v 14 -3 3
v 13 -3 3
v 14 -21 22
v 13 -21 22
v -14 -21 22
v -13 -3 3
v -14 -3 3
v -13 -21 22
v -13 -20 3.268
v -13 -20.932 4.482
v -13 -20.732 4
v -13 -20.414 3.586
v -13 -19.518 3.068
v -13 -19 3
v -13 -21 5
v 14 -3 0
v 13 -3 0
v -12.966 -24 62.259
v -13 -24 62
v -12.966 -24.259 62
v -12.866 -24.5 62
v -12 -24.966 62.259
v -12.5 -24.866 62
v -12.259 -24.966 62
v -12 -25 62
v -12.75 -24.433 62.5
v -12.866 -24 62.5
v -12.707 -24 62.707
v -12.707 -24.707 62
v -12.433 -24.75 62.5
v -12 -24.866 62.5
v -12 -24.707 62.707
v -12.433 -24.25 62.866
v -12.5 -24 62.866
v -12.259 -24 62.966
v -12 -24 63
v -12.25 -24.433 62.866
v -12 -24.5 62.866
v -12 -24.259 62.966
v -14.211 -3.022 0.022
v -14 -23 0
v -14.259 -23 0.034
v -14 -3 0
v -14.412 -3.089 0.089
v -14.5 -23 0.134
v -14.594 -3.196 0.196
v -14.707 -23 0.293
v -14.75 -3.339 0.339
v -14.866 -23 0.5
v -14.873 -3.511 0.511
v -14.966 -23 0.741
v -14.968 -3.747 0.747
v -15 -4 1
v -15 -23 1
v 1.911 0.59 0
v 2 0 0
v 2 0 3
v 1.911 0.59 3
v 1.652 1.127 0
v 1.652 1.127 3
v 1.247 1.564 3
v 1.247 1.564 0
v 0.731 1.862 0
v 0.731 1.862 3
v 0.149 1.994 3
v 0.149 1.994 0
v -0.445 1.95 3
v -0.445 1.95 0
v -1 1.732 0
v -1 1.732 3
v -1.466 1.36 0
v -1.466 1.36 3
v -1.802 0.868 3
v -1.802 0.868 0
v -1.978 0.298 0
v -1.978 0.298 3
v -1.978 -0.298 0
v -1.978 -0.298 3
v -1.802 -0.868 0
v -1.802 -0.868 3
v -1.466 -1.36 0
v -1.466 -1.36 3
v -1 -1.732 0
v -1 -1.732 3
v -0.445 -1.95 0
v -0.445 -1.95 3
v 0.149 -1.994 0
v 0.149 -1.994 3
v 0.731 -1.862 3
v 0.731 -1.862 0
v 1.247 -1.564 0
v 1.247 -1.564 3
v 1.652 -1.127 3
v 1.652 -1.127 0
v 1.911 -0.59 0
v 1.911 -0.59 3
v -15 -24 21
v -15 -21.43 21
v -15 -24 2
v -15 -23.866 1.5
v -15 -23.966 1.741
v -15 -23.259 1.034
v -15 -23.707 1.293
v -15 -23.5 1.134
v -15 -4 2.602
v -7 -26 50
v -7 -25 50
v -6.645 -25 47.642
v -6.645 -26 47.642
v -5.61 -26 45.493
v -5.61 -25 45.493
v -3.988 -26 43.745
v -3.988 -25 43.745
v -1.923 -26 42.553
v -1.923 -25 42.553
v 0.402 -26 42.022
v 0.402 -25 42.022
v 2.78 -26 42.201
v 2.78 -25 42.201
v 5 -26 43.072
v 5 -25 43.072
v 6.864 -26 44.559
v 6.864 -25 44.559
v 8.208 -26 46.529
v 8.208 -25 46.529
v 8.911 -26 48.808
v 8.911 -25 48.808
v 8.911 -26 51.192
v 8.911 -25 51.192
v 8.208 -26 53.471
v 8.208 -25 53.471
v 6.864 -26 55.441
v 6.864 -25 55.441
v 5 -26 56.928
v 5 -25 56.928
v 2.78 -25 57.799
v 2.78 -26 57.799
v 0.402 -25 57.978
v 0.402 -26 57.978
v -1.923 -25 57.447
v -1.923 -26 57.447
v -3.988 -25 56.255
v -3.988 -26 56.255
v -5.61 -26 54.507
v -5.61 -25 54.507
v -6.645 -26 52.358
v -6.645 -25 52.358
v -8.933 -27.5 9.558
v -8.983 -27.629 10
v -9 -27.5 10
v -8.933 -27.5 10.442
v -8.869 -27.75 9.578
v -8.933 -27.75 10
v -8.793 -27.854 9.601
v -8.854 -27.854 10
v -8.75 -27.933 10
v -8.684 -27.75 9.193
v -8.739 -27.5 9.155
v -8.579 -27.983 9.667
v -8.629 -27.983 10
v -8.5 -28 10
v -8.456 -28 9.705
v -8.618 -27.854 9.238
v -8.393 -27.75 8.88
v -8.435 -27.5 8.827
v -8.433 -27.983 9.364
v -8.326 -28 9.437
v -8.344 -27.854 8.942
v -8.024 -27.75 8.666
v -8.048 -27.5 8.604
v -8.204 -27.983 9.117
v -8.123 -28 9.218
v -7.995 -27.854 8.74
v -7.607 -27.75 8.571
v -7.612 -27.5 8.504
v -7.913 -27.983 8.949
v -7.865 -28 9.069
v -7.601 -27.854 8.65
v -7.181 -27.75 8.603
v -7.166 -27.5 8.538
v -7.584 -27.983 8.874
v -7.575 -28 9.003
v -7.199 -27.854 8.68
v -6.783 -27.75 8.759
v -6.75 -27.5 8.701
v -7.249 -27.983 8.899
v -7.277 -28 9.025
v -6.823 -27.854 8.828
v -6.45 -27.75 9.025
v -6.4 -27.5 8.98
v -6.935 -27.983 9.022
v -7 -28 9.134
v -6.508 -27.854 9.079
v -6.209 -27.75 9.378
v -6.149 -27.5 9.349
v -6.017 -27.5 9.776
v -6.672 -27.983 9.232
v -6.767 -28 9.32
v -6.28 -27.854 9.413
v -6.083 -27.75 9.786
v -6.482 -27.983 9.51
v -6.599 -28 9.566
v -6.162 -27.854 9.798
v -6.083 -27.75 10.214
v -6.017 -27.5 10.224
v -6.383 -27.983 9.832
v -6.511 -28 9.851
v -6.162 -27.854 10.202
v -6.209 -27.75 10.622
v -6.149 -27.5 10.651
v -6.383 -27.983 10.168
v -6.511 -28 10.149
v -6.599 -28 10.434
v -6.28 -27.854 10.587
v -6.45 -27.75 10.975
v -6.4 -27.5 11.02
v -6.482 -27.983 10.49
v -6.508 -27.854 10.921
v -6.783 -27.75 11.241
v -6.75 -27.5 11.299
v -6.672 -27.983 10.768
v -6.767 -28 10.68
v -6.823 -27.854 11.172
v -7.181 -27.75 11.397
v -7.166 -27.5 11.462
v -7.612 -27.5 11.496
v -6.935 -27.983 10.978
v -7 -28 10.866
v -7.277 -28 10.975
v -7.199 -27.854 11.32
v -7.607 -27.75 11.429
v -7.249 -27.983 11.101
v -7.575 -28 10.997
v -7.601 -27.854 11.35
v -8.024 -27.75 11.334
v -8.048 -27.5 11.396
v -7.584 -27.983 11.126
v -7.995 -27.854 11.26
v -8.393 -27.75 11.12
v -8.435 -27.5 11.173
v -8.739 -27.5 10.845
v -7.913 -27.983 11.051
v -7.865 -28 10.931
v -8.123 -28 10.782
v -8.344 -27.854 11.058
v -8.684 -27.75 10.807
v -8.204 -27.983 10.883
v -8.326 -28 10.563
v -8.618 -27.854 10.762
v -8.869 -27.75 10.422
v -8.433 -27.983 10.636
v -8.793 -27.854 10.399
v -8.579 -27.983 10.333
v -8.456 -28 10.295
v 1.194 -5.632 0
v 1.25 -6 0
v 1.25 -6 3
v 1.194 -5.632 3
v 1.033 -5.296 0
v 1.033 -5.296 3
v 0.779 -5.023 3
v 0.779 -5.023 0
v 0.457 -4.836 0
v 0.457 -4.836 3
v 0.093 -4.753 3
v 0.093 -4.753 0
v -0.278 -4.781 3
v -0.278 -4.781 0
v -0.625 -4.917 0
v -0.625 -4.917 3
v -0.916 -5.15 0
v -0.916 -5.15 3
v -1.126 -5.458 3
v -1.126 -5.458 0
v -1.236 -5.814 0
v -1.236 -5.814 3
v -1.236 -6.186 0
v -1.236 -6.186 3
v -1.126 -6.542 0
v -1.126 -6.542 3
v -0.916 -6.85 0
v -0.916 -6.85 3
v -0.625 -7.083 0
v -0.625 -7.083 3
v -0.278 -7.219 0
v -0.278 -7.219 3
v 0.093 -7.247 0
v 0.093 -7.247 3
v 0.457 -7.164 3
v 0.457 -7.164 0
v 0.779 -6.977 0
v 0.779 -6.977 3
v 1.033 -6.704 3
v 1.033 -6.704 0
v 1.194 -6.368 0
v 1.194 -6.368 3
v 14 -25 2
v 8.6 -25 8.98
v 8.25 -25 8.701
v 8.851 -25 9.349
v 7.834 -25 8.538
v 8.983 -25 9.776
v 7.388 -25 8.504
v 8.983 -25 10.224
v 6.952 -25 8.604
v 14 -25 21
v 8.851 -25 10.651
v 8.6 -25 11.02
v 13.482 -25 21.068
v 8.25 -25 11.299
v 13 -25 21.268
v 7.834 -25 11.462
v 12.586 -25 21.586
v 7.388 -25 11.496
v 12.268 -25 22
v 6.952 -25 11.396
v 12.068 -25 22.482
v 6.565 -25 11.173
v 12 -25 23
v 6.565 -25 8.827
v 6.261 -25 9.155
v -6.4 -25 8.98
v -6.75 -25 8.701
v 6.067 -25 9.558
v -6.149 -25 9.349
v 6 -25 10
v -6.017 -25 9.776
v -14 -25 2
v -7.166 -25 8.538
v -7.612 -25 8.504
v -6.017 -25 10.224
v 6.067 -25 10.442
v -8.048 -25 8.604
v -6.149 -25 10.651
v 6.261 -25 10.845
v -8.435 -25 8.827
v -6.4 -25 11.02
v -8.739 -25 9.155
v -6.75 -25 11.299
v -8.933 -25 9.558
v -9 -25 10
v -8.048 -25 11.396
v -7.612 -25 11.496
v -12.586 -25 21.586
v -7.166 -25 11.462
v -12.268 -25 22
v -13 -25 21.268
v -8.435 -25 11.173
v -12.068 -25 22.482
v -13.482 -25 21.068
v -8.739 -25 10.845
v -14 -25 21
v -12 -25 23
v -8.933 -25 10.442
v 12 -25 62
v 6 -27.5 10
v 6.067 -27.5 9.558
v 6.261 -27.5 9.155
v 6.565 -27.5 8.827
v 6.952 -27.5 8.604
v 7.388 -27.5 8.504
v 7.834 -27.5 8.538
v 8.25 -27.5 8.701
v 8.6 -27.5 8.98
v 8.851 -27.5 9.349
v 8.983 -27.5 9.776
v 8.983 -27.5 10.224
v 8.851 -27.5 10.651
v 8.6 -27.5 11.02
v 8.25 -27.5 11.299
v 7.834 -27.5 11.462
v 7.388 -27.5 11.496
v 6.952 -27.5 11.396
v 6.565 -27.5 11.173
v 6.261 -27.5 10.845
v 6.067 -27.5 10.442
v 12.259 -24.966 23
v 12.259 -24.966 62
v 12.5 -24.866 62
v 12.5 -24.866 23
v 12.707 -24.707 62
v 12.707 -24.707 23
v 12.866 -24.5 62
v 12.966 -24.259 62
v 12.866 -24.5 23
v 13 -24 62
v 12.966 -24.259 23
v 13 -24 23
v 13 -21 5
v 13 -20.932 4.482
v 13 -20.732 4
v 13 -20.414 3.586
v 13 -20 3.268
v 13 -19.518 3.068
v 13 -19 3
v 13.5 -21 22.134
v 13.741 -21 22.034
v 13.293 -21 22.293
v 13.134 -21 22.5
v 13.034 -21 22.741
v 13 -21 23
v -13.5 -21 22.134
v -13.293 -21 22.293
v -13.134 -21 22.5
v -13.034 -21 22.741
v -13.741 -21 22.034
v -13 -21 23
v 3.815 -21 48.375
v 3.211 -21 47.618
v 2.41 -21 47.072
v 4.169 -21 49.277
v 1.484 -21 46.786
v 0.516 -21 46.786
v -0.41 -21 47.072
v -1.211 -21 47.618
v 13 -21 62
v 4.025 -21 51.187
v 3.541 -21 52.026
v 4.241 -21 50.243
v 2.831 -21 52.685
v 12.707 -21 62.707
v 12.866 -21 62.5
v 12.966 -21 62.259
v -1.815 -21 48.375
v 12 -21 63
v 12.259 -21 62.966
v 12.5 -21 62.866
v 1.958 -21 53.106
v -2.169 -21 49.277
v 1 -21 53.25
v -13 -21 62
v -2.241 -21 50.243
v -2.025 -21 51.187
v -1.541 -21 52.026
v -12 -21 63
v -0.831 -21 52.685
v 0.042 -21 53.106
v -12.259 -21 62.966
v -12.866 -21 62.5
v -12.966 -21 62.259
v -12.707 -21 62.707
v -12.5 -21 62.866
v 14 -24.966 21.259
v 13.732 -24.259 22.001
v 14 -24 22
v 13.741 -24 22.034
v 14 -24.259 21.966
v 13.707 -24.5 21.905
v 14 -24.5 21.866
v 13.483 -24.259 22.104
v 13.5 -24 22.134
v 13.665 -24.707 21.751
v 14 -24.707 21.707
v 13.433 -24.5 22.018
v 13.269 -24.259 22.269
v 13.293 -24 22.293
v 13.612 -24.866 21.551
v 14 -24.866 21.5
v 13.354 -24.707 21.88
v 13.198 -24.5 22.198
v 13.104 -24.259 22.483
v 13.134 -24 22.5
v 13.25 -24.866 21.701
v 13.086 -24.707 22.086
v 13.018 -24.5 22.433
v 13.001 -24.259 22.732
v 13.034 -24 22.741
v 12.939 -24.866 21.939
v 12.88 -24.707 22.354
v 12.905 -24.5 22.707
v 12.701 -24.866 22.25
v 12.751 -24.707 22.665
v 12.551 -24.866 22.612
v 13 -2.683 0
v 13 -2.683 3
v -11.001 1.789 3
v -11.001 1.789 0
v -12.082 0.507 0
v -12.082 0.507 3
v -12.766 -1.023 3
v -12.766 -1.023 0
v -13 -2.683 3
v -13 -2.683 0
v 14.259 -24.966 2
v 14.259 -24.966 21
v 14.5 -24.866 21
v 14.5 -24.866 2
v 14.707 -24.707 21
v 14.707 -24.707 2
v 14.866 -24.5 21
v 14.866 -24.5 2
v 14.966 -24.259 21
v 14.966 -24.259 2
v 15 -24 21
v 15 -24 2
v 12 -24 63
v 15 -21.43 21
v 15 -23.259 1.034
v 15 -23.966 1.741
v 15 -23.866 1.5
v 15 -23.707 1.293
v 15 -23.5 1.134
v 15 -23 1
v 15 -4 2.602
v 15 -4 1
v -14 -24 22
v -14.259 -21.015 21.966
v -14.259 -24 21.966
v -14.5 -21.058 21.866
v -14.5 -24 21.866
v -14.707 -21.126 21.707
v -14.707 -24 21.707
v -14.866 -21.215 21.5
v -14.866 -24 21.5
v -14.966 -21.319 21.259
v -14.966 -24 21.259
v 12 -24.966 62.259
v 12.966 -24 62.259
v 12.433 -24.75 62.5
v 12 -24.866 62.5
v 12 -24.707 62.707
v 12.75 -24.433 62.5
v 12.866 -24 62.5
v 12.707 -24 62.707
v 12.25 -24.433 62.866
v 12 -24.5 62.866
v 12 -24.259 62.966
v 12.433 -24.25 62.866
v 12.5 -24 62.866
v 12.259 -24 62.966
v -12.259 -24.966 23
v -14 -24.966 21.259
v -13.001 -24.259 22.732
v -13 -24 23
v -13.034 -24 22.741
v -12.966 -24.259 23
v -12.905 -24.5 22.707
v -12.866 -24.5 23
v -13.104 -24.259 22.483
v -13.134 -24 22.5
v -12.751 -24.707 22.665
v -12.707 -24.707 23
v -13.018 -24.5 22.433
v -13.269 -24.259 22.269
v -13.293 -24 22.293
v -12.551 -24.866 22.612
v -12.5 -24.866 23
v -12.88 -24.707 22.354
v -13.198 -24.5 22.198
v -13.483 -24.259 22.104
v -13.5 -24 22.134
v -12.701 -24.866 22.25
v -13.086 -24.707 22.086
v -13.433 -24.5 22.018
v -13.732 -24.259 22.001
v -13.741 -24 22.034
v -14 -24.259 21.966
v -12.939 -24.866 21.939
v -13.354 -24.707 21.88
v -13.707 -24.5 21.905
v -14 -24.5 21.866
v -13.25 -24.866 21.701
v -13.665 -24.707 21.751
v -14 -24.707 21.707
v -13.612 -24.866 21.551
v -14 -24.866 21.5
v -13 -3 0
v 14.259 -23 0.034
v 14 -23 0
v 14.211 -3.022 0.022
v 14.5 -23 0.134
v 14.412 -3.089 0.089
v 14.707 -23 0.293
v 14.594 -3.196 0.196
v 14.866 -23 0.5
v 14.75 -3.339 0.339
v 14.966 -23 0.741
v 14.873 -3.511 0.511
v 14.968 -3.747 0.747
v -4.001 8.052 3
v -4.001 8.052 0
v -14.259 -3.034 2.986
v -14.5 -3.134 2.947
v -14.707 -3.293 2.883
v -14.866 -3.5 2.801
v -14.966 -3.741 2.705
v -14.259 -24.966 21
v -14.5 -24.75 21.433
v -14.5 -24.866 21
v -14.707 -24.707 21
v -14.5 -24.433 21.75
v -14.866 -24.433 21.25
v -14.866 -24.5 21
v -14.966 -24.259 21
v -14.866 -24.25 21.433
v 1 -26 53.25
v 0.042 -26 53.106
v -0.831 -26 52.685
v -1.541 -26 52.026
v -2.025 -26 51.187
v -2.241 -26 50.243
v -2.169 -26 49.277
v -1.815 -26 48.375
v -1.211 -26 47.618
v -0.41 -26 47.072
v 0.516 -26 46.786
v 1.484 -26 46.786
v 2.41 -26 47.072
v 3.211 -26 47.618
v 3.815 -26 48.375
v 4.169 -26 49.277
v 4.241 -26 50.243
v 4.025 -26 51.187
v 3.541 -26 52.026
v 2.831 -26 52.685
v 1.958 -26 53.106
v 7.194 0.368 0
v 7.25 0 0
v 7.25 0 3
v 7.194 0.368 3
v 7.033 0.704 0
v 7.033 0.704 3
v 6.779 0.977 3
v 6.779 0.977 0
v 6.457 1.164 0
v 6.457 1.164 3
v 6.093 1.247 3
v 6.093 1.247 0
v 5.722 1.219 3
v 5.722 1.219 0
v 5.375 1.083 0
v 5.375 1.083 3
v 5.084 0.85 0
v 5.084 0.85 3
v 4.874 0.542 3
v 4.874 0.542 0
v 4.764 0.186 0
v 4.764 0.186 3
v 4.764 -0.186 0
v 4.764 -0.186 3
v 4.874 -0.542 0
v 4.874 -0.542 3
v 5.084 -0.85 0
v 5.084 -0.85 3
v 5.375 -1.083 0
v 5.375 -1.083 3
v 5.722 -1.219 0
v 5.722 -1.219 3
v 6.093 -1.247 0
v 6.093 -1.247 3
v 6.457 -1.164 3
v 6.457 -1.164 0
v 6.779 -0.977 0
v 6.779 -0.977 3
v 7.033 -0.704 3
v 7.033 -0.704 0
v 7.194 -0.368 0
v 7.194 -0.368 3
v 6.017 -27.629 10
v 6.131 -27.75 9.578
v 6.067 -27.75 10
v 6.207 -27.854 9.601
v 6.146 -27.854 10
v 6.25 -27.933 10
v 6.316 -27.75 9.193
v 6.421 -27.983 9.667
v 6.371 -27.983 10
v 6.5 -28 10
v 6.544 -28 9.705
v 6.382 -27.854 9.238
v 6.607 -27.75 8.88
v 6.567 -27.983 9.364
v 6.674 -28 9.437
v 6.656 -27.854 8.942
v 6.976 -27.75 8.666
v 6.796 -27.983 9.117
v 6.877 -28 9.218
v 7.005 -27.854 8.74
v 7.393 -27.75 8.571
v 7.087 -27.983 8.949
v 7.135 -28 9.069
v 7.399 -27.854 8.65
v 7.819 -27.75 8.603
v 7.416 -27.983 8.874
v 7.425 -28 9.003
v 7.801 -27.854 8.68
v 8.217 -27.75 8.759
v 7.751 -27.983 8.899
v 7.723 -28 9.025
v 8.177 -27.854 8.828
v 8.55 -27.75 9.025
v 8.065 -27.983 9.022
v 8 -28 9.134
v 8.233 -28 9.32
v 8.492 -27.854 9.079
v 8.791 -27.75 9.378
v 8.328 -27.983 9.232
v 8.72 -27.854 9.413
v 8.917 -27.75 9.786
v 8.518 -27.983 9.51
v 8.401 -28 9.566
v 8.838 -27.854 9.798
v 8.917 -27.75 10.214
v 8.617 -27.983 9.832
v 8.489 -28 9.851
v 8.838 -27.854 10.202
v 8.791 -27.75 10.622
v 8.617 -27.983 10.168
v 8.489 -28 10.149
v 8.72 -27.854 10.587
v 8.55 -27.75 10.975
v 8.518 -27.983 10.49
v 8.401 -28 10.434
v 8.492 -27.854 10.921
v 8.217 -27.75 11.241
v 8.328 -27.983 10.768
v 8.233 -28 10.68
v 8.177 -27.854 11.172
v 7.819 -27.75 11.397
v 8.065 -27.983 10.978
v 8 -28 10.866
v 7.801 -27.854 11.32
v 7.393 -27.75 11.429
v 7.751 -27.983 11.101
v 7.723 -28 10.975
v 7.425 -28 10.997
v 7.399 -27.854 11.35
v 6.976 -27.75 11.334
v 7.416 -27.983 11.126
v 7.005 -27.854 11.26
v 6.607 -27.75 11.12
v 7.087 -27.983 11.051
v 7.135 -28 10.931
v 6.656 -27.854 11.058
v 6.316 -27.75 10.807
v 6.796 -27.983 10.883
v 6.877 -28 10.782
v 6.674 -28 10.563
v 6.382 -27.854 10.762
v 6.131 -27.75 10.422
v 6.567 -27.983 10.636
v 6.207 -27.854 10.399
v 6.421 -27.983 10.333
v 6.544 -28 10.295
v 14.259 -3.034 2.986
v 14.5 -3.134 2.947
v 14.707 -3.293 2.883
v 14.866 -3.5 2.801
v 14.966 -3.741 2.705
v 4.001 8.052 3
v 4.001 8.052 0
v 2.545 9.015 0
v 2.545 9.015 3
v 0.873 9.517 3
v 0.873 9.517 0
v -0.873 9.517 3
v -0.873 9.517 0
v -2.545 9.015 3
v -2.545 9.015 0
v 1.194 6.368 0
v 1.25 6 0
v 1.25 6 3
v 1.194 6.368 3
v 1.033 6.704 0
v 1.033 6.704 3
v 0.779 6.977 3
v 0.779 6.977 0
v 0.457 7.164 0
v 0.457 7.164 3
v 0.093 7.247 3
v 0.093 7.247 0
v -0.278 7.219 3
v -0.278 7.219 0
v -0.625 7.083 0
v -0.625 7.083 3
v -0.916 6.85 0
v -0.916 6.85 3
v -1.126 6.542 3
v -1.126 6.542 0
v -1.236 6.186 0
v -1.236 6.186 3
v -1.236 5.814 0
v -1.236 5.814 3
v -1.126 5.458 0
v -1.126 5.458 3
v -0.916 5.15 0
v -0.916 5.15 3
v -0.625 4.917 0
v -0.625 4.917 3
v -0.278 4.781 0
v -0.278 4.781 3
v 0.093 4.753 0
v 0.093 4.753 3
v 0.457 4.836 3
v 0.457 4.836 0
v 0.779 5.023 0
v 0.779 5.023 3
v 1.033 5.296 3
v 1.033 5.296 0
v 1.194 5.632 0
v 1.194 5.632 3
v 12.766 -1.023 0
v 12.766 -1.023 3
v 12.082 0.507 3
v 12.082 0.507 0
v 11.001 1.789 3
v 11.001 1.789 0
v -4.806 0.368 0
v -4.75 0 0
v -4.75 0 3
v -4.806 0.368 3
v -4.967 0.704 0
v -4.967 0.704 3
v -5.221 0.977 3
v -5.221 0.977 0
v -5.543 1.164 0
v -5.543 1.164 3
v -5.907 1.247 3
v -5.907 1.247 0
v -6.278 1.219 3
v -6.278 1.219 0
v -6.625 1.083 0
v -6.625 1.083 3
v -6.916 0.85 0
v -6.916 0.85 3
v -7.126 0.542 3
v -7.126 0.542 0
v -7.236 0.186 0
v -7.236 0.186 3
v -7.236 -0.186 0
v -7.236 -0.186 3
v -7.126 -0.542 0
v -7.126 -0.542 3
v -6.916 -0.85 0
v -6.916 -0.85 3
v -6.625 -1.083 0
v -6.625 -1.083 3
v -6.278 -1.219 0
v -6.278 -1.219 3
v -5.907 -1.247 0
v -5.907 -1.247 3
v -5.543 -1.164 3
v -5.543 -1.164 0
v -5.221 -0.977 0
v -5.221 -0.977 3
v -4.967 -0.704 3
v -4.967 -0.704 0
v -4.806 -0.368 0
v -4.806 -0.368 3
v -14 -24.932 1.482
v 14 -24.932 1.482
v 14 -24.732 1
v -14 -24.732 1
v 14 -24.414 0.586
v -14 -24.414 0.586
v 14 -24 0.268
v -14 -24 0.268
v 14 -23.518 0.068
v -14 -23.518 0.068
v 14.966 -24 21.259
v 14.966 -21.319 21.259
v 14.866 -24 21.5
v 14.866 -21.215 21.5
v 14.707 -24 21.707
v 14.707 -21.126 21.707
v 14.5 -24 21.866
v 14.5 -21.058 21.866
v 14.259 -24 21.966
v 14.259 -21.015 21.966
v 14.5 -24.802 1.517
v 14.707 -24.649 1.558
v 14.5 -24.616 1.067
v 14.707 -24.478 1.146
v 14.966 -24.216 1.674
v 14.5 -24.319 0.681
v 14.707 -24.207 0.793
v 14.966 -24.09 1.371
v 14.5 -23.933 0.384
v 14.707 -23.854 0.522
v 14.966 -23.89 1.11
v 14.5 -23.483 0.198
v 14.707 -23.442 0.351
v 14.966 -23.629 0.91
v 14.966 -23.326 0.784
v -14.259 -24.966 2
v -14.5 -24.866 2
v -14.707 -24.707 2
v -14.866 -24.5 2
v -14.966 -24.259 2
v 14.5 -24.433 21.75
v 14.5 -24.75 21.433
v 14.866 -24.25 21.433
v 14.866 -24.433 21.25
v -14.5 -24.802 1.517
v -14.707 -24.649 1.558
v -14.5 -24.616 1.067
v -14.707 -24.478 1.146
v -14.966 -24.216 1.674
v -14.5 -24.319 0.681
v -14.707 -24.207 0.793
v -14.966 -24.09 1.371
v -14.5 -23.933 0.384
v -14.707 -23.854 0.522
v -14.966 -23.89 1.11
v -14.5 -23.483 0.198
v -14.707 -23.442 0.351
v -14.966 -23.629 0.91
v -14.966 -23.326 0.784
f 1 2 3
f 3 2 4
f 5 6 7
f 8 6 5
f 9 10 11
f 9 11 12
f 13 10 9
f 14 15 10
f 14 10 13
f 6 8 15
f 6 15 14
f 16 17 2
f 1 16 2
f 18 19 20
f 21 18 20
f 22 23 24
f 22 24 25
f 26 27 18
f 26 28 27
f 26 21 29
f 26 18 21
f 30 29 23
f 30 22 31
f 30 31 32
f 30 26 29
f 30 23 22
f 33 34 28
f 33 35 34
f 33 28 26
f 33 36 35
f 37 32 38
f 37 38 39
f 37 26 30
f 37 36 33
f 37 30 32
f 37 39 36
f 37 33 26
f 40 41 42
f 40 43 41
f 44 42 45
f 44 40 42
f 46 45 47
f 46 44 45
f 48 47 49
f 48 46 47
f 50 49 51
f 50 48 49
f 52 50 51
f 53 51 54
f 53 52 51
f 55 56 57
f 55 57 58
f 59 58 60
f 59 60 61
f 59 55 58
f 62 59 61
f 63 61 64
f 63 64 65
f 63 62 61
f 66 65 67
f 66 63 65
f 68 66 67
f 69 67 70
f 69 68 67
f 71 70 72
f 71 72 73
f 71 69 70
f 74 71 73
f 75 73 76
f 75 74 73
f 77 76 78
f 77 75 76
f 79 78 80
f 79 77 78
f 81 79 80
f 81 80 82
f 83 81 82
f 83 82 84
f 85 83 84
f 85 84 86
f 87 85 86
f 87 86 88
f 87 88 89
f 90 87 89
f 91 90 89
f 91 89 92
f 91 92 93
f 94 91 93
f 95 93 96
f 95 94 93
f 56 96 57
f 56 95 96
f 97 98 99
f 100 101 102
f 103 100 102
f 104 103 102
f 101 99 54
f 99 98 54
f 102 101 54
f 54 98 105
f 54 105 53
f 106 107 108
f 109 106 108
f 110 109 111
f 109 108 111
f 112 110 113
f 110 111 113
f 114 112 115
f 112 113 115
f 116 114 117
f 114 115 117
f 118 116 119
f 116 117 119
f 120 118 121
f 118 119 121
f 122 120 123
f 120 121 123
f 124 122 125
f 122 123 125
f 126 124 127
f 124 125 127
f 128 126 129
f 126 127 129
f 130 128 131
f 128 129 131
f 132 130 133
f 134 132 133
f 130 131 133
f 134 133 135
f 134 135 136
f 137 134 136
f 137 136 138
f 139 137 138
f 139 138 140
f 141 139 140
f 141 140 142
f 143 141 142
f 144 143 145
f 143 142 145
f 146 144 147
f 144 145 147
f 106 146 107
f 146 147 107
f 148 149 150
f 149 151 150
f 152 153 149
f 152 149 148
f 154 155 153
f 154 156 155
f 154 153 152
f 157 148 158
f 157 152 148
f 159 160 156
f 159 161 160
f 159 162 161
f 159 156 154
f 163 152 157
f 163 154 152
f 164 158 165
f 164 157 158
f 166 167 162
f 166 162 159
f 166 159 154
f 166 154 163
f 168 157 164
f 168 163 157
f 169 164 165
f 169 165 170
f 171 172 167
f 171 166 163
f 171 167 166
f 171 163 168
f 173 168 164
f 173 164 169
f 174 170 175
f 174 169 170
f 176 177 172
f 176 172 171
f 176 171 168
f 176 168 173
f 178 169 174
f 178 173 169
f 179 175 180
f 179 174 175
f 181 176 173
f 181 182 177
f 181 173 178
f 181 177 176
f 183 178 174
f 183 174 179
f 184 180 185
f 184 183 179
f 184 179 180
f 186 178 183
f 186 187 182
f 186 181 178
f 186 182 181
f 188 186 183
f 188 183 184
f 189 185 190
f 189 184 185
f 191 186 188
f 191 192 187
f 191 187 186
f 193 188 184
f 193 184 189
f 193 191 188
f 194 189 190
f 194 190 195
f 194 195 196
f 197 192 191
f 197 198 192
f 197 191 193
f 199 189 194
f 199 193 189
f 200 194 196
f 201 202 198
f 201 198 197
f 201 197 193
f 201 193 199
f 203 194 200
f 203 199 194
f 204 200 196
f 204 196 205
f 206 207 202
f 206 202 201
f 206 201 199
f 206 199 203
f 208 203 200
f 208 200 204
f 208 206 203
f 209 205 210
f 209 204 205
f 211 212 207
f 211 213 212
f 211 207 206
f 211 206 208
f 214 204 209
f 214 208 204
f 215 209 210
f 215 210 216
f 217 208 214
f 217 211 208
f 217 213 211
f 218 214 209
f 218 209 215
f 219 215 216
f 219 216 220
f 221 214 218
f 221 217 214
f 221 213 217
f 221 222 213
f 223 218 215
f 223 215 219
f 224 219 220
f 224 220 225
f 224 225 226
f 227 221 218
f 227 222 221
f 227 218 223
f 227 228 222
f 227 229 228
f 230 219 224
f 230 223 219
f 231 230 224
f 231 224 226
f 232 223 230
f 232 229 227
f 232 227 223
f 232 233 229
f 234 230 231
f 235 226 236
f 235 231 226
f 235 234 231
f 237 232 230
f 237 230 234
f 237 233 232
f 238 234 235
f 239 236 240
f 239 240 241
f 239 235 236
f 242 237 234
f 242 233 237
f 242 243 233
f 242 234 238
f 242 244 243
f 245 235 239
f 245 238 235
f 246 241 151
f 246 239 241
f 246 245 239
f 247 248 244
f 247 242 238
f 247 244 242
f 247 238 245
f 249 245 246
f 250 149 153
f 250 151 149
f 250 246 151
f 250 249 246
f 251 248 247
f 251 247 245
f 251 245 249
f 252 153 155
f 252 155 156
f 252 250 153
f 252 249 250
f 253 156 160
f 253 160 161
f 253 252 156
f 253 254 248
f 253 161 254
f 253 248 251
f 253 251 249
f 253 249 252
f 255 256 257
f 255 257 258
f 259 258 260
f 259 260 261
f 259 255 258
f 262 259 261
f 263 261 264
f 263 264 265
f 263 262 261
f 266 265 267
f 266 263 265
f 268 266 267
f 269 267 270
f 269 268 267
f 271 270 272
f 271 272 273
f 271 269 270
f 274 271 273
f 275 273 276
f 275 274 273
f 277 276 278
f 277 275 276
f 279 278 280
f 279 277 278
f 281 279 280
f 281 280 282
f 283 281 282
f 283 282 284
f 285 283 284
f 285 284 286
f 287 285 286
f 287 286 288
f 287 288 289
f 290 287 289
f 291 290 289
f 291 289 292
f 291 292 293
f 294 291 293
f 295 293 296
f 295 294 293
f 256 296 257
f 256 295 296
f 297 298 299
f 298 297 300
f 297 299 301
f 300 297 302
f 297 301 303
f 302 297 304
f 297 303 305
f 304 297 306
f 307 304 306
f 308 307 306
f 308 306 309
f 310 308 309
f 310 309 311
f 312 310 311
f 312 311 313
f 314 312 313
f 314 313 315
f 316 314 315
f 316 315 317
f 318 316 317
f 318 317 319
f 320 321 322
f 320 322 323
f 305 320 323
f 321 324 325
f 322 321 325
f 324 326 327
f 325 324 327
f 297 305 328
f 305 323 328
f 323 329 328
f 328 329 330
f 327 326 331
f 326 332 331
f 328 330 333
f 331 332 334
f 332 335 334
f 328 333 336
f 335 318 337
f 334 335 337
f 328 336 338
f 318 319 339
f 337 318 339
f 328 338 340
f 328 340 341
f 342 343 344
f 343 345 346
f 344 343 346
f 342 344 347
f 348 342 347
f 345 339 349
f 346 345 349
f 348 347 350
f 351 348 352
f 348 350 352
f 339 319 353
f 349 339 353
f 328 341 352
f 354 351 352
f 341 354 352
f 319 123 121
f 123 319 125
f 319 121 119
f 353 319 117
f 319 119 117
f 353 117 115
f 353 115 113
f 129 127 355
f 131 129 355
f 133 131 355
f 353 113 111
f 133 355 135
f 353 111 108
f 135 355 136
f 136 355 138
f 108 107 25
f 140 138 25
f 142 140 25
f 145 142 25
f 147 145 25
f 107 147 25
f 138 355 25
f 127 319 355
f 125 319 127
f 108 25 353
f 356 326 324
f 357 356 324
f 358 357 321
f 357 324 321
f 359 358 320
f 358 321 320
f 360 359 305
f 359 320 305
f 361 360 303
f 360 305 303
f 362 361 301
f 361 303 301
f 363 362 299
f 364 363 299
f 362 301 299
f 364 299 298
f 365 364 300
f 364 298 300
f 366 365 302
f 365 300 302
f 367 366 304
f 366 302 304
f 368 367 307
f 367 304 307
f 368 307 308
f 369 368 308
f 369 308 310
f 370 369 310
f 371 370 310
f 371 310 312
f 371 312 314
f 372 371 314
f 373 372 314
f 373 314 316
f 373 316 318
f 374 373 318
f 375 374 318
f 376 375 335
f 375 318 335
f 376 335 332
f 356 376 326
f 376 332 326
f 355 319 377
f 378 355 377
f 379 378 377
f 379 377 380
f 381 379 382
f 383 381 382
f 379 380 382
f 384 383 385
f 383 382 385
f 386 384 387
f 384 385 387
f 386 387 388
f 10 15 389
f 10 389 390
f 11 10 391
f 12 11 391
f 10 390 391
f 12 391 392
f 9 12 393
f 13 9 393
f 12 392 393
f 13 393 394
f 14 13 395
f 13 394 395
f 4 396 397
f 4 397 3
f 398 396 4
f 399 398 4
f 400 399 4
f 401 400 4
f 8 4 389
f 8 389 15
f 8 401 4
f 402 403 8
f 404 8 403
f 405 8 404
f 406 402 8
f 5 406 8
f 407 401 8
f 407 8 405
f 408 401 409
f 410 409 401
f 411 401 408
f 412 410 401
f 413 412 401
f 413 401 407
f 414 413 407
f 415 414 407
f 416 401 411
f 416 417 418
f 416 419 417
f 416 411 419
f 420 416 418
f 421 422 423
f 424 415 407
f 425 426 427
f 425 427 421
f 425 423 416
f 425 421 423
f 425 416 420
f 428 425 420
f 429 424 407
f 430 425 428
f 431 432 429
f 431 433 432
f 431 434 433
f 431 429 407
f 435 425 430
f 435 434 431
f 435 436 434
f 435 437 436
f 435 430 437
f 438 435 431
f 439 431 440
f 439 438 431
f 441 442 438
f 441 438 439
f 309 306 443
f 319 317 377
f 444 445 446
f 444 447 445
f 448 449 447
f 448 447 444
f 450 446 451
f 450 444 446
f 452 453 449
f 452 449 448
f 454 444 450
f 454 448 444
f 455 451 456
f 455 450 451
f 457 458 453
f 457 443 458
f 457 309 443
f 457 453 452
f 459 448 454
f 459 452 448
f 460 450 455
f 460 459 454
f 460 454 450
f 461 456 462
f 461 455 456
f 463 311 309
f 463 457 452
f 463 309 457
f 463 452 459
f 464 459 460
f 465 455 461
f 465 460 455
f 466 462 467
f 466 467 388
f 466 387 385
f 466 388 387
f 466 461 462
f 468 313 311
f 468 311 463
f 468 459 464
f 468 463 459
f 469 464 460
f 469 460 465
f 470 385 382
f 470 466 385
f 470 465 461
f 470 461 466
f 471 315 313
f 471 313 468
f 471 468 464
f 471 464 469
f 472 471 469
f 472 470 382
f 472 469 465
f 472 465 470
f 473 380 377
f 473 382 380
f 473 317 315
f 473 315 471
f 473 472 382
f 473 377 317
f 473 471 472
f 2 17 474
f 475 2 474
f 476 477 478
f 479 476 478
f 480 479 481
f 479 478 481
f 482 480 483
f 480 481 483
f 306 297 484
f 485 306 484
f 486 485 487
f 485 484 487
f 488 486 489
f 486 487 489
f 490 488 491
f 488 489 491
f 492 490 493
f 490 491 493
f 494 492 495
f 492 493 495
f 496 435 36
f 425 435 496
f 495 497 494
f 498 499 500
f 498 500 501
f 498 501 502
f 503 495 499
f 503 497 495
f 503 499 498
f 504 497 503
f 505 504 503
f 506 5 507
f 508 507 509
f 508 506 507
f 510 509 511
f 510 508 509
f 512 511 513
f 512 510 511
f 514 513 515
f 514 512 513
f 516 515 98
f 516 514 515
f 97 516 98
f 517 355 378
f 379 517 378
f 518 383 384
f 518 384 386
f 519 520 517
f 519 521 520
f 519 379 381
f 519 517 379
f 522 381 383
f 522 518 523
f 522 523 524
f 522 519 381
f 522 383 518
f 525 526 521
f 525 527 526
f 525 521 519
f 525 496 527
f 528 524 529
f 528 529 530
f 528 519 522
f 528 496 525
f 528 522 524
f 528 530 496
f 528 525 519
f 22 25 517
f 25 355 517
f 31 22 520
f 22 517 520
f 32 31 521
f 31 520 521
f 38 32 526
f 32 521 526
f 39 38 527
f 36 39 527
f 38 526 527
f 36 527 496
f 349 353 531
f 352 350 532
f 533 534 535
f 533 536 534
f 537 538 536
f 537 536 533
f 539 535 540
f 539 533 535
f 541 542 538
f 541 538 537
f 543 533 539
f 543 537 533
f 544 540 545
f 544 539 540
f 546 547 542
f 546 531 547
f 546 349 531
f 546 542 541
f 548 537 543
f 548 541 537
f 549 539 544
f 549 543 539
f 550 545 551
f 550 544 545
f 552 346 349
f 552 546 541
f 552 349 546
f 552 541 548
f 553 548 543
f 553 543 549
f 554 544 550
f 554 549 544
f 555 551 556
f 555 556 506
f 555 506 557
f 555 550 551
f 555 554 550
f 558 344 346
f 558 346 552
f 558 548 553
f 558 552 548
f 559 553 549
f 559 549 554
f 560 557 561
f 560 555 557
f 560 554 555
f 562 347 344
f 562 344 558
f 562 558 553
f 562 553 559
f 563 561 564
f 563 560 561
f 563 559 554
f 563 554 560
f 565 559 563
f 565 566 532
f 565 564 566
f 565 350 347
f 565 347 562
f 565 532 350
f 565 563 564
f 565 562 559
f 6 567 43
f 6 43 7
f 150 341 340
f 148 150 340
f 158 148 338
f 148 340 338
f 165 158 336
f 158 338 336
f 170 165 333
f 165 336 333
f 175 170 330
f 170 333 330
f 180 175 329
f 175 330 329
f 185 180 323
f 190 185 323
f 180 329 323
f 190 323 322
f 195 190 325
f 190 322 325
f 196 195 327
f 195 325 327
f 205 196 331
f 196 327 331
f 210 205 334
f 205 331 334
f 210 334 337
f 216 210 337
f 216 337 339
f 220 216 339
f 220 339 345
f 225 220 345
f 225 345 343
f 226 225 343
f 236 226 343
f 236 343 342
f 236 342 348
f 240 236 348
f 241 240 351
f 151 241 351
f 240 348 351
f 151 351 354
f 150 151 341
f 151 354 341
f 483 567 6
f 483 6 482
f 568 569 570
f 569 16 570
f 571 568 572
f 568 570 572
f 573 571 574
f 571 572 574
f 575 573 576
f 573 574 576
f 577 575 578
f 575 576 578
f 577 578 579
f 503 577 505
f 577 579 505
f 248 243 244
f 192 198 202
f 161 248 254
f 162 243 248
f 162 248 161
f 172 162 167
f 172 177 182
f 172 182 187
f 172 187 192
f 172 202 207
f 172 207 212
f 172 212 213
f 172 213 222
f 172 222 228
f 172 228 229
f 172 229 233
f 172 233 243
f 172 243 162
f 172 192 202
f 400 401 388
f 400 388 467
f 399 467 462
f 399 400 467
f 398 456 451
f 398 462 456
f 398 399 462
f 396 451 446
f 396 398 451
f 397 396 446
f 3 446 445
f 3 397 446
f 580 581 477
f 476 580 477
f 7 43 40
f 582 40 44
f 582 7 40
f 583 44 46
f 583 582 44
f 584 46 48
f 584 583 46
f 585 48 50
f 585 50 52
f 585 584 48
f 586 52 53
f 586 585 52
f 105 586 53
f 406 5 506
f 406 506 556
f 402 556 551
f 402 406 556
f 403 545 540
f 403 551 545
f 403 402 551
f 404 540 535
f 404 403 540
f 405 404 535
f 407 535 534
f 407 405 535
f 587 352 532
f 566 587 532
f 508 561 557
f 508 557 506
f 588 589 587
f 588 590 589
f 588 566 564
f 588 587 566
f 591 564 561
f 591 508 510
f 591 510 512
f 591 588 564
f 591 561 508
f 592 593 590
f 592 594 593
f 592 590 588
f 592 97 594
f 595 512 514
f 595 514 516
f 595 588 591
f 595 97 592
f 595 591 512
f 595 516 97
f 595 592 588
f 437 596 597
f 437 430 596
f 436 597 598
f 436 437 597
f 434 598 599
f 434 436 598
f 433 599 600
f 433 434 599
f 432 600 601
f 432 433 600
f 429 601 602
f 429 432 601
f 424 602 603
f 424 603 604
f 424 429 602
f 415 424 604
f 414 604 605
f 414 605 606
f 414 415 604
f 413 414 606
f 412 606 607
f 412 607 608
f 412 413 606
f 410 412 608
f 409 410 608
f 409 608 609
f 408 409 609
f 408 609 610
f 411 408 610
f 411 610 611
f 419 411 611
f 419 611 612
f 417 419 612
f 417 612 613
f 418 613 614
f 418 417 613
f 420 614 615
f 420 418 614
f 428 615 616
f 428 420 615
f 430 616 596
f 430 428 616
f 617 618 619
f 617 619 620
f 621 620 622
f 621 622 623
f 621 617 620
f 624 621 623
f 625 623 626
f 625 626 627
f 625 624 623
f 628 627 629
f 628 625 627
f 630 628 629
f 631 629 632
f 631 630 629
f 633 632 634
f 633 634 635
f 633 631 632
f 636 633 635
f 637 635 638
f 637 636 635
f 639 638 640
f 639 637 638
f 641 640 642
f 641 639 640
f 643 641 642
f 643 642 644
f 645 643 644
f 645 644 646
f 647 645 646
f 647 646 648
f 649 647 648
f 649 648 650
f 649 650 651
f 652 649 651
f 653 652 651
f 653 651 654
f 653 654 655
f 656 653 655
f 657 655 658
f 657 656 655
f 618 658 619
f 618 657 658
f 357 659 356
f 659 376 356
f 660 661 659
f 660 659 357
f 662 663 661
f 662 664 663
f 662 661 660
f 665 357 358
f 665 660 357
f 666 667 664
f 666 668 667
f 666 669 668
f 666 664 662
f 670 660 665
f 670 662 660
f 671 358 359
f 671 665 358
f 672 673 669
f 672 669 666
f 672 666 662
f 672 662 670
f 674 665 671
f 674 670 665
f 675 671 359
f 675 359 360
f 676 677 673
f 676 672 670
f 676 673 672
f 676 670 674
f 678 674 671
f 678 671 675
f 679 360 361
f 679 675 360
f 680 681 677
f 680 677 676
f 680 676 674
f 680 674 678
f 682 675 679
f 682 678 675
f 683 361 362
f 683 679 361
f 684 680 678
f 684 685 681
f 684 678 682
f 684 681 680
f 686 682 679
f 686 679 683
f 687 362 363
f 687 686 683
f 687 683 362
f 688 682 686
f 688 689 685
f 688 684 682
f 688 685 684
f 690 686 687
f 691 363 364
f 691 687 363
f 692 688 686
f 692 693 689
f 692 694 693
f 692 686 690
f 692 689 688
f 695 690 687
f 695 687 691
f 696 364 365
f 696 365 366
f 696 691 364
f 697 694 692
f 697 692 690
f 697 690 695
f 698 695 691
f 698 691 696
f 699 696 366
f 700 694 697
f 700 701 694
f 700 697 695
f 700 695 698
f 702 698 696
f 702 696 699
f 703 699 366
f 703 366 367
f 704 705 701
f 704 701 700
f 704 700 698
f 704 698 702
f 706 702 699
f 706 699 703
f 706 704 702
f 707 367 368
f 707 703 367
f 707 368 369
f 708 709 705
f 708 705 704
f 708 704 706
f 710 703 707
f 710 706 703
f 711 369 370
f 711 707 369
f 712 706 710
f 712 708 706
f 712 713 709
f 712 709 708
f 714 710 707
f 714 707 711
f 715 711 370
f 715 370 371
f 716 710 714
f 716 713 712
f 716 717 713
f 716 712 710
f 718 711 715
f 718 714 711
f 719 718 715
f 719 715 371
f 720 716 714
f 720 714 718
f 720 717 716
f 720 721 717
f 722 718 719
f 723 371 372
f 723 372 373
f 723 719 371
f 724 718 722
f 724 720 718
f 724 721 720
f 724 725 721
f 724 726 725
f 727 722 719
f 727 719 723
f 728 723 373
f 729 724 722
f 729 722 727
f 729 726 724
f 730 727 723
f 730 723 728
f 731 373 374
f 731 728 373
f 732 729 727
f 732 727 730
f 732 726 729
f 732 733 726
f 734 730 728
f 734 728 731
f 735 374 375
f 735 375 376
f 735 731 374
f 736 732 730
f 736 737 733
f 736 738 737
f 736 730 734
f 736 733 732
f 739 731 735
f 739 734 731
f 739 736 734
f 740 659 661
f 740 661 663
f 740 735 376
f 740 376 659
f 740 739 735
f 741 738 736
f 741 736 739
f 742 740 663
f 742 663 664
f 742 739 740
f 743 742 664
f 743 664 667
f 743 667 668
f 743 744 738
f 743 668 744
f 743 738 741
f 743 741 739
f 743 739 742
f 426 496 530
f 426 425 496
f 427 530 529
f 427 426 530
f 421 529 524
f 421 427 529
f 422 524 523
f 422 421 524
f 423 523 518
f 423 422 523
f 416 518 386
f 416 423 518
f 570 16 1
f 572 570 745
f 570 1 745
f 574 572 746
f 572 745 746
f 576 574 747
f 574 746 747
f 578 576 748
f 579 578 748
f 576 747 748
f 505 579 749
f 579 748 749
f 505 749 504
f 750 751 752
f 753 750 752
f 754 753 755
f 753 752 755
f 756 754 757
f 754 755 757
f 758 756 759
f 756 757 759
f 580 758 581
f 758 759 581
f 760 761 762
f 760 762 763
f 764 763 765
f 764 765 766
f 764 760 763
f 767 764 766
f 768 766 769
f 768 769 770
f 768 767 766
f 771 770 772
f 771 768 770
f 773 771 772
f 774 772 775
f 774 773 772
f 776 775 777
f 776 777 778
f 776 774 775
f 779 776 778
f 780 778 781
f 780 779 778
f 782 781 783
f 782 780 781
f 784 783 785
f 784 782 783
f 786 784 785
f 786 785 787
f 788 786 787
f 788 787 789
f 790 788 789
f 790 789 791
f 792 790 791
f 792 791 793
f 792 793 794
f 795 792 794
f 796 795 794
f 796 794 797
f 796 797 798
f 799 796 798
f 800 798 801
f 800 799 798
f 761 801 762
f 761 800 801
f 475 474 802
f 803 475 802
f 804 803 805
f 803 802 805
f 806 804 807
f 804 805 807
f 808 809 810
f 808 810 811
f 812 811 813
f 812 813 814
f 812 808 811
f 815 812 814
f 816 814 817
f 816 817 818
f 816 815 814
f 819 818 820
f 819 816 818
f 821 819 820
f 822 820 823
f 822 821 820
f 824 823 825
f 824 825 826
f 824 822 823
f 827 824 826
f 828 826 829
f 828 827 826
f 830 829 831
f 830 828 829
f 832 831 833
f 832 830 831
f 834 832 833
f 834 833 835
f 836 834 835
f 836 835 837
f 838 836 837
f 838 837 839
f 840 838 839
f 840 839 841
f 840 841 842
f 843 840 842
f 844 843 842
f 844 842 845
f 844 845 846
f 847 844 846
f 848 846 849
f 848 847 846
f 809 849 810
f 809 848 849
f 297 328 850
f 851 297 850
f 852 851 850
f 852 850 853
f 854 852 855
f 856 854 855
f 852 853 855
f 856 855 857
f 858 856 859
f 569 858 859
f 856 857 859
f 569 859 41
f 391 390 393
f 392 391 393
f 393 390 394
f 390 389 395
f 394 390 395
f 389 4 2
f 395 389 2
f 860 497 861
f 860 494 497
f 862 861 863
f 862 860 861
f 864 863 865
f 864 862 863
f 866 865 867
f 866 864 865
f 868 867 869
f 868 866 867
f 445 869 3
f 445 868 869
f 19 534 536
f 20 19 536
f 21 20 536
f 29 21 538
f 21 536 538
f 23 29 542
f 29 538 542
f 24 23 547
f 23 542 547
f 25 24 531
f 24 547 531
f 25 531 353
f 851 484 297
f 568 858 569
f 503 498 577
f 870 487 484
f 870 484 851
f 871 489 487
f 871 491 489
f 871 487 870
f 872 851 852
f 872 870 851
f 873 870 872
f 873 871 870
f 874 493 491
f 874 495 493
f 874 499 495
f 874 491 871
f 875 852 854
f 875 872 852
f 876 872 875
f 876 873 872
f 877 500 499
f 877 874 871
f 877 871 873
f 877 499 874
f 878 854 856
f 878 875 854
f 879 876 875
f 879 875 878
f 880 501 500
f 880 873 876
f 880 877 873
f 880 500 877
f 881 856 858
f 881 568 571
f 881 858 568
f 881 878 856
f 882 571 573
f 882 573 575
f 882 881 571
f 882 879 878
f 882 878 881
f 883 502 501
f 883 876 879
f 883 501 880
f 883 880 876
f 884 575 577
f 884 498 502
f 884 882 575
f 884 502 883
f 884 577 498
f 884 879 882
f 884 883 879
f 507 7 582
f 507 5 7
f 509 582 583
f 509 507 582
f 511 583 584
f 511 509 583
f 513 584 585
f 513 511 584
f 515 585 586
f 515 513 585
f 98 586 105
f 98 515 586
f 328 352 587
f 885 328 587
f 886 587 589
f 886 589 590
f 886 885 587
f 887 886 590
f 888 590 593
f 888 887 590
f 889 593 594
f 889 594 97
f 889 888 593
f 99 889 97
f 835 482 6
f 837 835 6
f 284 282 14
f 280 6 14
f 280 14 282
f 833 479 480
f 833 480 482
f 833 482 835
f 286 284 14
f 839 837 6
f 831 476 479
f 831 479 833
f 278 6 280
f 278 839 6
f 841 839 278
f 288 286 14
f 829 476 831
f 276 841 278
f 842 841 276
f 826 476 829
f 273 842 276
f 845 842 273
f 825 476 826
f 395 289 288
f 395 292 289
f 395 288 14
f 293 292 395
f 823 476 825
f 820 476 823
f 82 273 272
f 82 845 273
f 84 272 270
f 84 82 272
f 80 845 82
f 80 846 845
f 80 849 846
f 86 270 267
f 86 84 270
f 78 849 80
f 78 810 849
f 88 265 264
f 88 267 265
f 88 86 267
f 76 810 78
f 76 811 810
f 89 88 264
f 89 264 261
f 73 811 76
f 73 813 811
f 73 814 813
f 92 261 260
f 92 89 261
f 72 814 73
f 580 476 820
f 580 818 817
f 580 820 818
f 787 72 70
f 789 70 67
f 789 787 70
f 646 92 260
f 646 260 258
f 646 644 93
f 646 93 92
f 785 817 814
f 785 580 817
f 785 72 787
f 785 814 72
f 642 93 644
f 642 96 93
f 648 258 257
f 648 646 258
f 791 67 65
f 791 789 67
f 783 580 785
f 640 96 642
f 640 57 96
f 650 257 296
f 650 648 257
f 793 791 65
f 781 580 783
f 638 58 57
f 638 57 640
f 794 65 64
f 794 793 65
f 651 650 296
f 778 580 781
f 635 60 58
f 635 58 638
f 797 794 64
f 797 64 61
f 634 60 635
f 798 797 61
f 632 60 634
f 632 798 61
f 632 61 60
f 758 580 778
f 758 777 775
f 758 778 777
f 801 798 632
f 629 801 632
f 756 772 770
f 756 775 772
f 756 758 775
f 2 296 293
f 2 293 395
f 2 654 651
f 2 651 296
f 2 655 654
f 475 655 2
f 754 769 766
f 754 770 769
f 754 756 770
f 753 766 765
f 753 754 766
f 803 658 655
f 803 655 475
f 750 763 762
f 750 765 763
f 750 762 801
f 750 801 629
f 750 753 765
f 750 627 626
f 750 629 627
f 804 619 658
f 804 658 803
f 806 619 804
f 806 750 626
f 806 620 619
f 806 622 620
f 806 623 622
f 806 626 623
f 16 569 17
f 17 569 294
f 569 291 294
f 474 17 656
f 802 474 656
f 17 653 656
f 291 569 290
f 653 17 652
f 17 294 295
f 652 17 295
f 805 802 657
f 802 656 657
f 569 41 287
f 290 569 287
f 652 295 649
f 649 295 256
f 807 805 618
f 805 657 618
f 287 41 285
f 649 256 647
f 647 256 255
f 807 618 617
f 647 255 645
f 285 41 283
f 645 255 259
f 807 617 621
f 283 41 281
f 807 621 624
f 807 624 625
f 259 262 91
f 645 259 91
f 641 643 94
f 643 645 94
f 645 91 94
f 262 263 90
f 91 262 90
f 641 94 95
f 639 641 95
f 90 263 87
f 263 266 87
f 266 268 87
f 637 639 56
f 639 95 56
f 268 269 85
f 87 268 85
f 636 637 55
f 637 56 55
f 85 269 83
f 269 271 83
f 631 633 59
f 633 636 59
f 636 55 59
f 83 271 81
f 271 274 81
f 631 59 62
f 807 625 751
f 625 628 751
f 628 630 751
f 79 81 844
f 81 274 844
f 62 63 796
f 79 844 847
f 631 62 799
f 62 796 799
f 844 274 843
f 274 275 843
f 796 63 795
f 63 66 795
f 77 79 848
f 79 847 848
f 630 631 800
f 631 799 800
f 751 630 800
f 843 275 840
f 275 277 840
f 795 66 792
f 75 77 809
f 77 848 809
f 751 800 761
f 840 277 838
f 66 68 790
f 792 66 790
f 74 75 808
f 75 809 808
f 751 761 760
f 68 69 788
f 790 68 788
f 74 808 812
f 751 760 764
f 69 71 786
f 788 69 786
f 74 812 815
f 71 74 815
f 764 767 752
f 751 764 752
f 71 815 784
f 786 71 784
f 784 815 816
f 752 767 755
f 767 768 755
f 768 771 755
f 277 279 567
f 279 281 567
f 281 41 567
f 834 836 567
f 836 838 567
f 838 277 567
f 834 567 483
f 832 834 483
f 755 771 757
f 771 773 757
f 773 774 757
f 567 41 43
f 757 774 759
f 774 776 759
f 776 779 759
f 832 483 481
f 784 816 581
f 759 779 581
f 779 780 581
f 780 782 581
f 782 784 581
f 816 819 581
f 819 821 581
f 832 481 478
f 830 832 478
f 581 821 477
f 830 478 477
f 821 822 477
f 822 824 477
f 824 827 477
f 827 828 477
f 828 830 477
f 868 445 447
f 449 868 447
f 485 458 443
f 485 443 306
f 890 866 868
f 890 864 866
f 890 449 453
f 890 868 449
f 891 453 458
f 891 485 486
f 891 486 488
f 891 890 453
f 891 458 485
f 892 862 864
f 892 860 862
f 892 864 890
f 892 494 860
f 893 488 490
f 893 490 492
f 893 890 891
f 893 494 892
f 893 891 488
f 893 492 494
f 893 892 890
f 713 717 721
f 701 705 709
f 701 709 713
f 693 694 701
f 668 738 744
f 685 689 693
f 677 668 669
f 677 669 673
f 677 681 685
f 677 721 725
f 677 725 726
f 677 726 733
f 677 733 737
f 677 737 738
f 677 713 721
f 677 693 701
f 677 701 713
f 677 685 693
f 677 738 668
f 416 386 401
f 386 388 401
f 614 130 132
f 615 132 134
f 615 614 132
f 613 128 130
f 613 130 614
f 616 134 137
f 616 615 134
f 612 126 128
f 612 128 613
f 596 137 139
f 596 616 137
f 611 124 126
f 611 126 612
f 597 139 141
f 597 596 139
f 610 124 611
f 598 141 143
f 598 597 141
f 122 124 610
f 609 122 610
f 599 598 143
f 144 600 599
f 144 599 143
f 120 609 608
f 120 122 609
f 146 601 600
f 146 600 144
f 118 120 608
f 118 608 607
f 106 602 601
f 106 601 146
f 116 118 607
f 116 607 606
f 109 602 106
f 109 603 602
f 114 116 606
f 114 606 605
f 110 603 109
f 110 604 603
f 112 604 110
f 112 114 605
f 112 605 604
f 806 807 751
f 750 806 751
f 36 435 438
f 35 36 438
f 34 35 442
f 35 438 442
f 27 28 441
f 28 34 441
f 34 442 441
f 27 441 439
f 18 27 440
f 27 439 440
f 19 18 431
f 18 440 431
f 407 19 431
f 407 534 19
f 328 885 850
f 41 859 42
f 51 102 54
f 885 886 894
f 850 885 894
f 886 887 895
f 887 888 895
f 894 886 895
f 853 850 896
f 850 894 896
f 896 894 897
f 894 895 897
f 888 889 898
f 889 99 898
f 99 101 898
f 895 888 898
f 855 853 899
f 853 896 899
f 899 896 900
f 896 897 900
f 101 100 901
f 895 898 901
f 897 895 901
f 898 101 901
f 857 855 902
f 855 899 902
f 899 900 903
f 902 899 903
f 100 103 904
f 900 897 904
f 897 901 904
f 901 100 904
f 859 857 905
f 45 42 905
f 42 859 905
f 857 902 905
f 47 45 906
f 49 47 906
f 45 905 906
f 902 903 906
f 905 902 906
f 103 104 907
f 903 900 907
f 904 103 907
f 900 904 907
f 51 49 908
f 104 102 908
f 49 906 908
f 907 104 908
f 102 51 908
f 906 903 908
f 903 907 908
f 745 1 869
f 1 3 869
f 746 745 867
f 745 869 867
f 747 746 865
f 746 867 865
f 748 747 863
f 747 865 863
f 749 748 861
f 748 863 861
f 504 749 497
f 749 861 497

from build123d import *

# Parameters (mm, degrees)
SKETCH1_R           = 2
SKETCH1_R_2         = 1.25
BOSS_EXTRUDE1_DEPTH = 3
SKETCH2_W           = 26
SKETCH2_H           = 4
BOSS_EXTRUDE2_DEPTH = 60
SKETCH3_R           = 3.25
CUT_EXTRUDE1_DEPTH  = 72.226350639
SKETCH4_R           = 8
SKETCH4_R_2         = 3.25
BOSS_EXTRUDE3_DEPTH = 1
SKETCH5_R           = 1.5
BOSS_EXTRUDE4_DEPTH = 3
BOSS_EXTRUDE5_DEPTH = 2
FILLET1_R           = 2
FILLET2_R           = 1
FILLET3_R           = 0.5


# Some blends are built 0.0001 mm under size
with BuildPart() as part:
    # Sketch1 → Boss-Extrude1 (new body)
    with BuildSketch(Plane.XY):
        with BuildLine():
            Line((-13, -2.68256679), (-13, -25))
            Line((-13, -25), (13, -25))
            Line((13, -25), (13, -2.68256679))
            ThreePointArc((13, -2.68256679), (12.477468733, -0.233620837), (11.000887907, 1.788774838))
            Line((11.000887907, 1.788774838), (4.000887907, 8.052267471))
            ThreePointArc((4.000887907, 8.052267471), (0, 9.580925842), (-4.000887907, 8.052267471))
            Line((-4.000887907, 8.052267471), (-11.000887907, 1.788774838))
            ThreePointArc((-11.000887907, 1.788774838), (-12.477468733, -0.233620837), (-13, -2.68256679))
        make_face()
        Circle(SKETCH1_R, mode=Mode.SUBTRACT)
        with Locations((-6, 0)):
            Circle(SKETCH1_R_2, mode=Mode.SUBTRACT)
        with Locations((0, 6)):
            Circle(SKETCH1_R_2, mode=Mode.SUBTRACT)
        with Locations((6, 0)):
            Circle(SKETCH1_R_2, mode=Mode.SUBTRACT)
        with Locations((0, -6)):
            Circle(SKETCH1_R_2, mode=Mode.SUBTRACT)
    extrude(amount=BOSS_EXTRUDE1_DEPTH)

    # Sketch2 → Boss-Extrude2 (add)
    with BuildSketch(Plane.XY.offset(3)):
        with Locations((0, -23)):
            Rectangle(SKETCH2_W, SKETCH2_H)
    extrude(amount=BOSS_EXTRUDE2_DEPTH)

    # Sketch3 → Cut-Extrude1 (cut, through all)
    with BuildSketch(Plane(origin=(0, -21, 0), x_dir=(1, 0, 0), z_dir=(0, 1, 0))):
        with Locations(Location((1, -50, 0), (0, 0, 270))):
            Circle(SKETCH3_R)
    extrude(amount=-CUT_EXTRUDE1_DEPTH, mode=Mode.SUBTRACT)

    # Sketch4 → Boss-Extrude3 (add)
    with BuildSketch(Plane.XZ.offset(25)):
        with Locations(Location((1, 50, 0), (0, 0, 180))):
            Circle(SKETCH4_R)
        with Locations(Location((1, 50, 0), (0, 0, 90))):
            Circle(SKETCH4_R_2, mode=Mode.SUBTRACT)
    extrude(amount=BOSS_EXTRUDE3_DEPTH)

    # Sketch5 → Boss-Extrude4 (add)
    with BuildSketch(Plane.XZ.offset(25)):
        with Locations(Location((-7.5, 10, 0), (0, 0, 180))):
            Circle(SKETCH5_R)
        with Locations(Location((7.5, 10, 0), (0, 0, 180))):
            Circle(SKETCH5_R)
    extrude(amount=BOSS_EXTRUDE4_DEPTH)

    # Sketch6 → Boss-Extrude5 (add)
    with BuildSketch(Plane.ZY.offset(13)):
        Polygon((0, -3), (3, -3), (22, -21), (22, -25), (0, -25), align=None)
    boss_extrude5 = extrude(amount=BOSS_EXTRUDE5_DEPTH)

    # Mirror1: Boss-Extrude5 across plane
    add(boss_extrude5.mirror(Plane(origin=(0, 0, 0), x_dir=(0, 0, 1), z_dir=(1, 0, 0))))

    # Fillet1
    fillet1_edges = [part.edges().sort_by_distance(p)[0] for p in [
        (0, -25, 0),
        (0, -21, 3),
    ]]
    fillet(fillet1_edges, radius=FILLET1_R)

    # Fillet2
    # the kernel refuses this fillet: 1 mm, written as the material it adds along each edge
    with BuildSketch(Plane(origin=(13, -21, 22), x_dir=(1, 0, 0), z_dir=(0, -1, 0)), Plane(origin=(-13, -21, 22), x_dir=(0, 0, 1), z_dir=(0, -1, 0))) as fillet2_piece_1:
        with BuildLine():
            CenterArc((FILLET2_R, FILLET2_R), FILLET2_R, 180, 90)
            Line((0, FILLET2_R), (-FILLET2_R * 0.02, FILLET2_R))
            Line((-FILLET2_R * 0.02, FILLET2_R), (-FILLET2_R * 0.02, -FILLET2_R * 0.02))
            Line((-FILLET2_R * 0.02, -FILLET2_R * 0.02), (FILLET2_R, -FILLET2_R * 0.02))
            Line((FILLET2_R, -FILLET2_R * 0.02), (FILLET2_R, 0))
        make_face()
    extrude(amount=4)
    fillet2_2_edges = [part.edges().sort_by_distance(p)[0] for p in [
        (15, -13, 0),
        (15, -3, 1.5),
        (15, -12, 12.5),
        (15, -23, 22),
        (15, -25, 12),
        (-15, -25, 12),
        (15, -24.414213562, 0.585786438),
        (-15, -24.414213562, 0.585786438),
        (-13, -23, 63),
        (0, -25, 63),
        (13, -23, 63),
        (-15, -13, 0),
        (-15, -23, 22),
        (-15, -12, 12.5),
        (-15, -3, 1.5),
    ]]
    fillet(fillet2_2_edges, radius=FILLET2_R - 0.0001)  # a hair under: the kernel refuses the full size
    # the kernel refuses this fillet: 1 mm, written as the material it takes off along each edge
    with BuildSketch(Plane(origin=(-15, -24, 21), x_dir=(0, -1, 0), z_dir=(0, 0, -1))) as fillet2_3_piece_1:
        with BuildLine():
            CenterArc((0.0001, -0.9999), 0.9999, 0, 90)
            Line((1, -0.9999), (1, 0))
            Line((1, 0), (0.0001, 0))
        make_face()
    revolve(axis=Axis((-15, -24, 21), (-1, 0, 0)), revolution_arc=90, mode=Mode.SUBTRACT)
    with BuildSketch(Plane(origin=(12, -24, 63), x_dir=(0, -1, 0), z_dir=(-1, 0, 0))) as fillet2_3_piece_2:
        with BuildLine():
            CenterArc((0.0001, -0.9999), 0.9999, 0, 90)
            Line((1, -0.9999), (1, 0))
            Line((1, 0), (0.0001, 0))
        make_face()
    revolve(axis=Axis((12, -24, 63), (0, 0, 1)), revolution_arc=90, mode=Mode.SUBTRACT)
    with BuildSketch(Plane(origin=(-12, -24, 63), x_dir=(-1, 0, 0), z_dir=(0, 1, 0))) as fillet2_3_piece_3:
        with BuildLine():
            CenterArc((0.0001, -0.9999), 0.9999, 0, 90)
            Line((1, -0.9999), (1, 0))
            Line((1, 0), (0.0001, 0))
        make_face()
    revolve(axis=Axis((-12, -24, 63), (0, 0, 1)), revolution_arc=90, mode=Mode.SUBTRACT)
    with BuildSketch(Plane(origin=(15, -24, 21), x_dir=(0, 0, 1), z_dir=(0, 1, 0))) as fillet2_3_piece_4:
        with BuildLine():
            CenterArc((0.0001, -0.9999), 0.9999, 0, 90)
            Line((1, -0.9999), (1, 0))
            Line((1, 0), (0.0001, 0))
        make_face()
    revolve(axis=Axis((15, -24, 21), (1, 0, 0)), revolution_arc=90, mode=Mode.SUBTRACT)
    with BuildSketch(Plane(origin=(14, -25, 22), x_dir=(0, 0, -1), z_dir=(1, 0, 0))) as fillet2_3_piece_5:
        with BuildLine():
            CenterArc((FILLET2_R, FILLET2_R), FILLET2_R, 180, 90)
            Line((0, FILLET2_R), (-FILLET2_R * 0.02, FILLET2_R))
            Line((-FILLET2_R * 0.02, FILLET2_R), (-FILLET2_R * 0.02, -FILLET2_R * 0.02))
            Line((-FILLET2_R * 0.02, -FILLET2_R * 0.02), (FILLET2_R, -FILLET2_R * 0.02))
            Line((FILLET2_R, -FILLET2_R * 0.02), (FILLET2_R, 0))
        make_face()
    extrude(amount=1, mode=Mode.SUBTRACT)
    with BuildSketch(Plane(origin=(-13, -25, 23), x_dir=(1, 0, 0), z_dir=(0, 0, 1))) as fillet2_3_piece_6:
        with BuildLine():
            CenterArc((FILLET2_R, FILLET2_R), FILLET2_R, 180, 90)
            Line((0, FILLET2_R), (-FILLET2_R * 0.02, FILLET2_R))
            Line((-FILLET2_R * 0.02, FILLET2_R), (-FILLET2_R * 0.02, -FILLET2_R * 0.02))
            Line((-FILLET2_R * 0.02, -FILLET2_R * 0.02), (FILLET2_R, -FILLET2_R * 0.02))
            Line((FILLET2_R, -FILLET2_R * 0.02), (FILLET2_R, 0))
        make_face()
    extrude(amount=40, mode=Mode.SUBTRACT)
    with BuildSketch(Plane(origin=(13, -25, 23), x_dir=(-1, 0, 0), z_dir=(0, 0, 1))) as fillet2_3_piece_7:
        with BuildLine():
            CenterArc((FILLET2_R, -FILLET2_R), FILLET2_R, 90, 90)
            Line((0, -FILLET2_R), (-FILLET2_R * 0.02, -FILLET2_R))
            Line((-FILLET2_R * 0.02, -FILLET2_R), (-FILLET2_R * 0.02, FILLET2_R * 0.02))
            Line((-FILLET2_R * 0.02, FILLET2_R * 0.02), (FILLET2_R, FILLET2_R * 0.02))
            Line((FILLET2_R, FILLET2_R * 0.02), (FILLET2_R, 0))
        make_face()
    extrude(amount=40, mode=Mode.SUBTRACT)
    with BuildSketch(Plane(origin=(-14, -25, 22), x_dir=(0, 0, -1), z_dir=(-1, 0, 0))) as fillet2_3_piece_8:
        with BuildLine():
            CenterArc((FILLET2_R, -FILLET2_R), FILLET2_R, 90, 90)
            Line((0, -FILLET2_R), (-FILLET2_R * 0.02, -FILLET2_R))
            Line((-FILLET2_R * 0.02, -FILLET2_R), (-FILLET2_R * 0.02, FILLET2_R * 0.02))
            Line((-FILLET2_R * 0.02, FILLET2_R * 0.02), (FILLET2_R, FILLET2_R * 0.02))
            Line((FILLET2_R, FILLET2_R * 0.02), (FILLET2_R, 0))
        make_face()
    extrude(amount=1, mode=Mode.SUBTRACT)
    with BuildSketch(Plane(origin=(-14, -25, 23), x_dir=(1, 0, 0), z_dir=(0, 0, 1))) as fillet2_3_piece_9:
        with BuildLine():
            CenterArc((1 + FILLET2_R, FILLET2_R), FILLET2_R, 180, 90)
            Line((1 + FILLET2_R, 0), (1 + FILLET2_R, -FILLET2_R * 0.02))
            Line((1 + FILLET2_R, -FILLET2_R * 0.02), (1 - FILLET2_R * 0.02, -FILLET2_R * 0.02))
            Line((1 - FILLET2_R * 0.02, -FILLET2_R * 0.02), (1 - FILLET2_R * 0.02, FILLET2_R))
            Line((1 - FILLET2_R * 0.02, FILLET2_R), (1, FILLET2_R))
        make_face()
    revolve(axis=Axis((-14, -25, 23), (0, 1, 0)), revolution_arc=90, mode=Mode.SUBTRACT)
    with BuildSketch(Plane(origin=(14, -25, 23), x_dir=(0, 0, -1), z_dir=(1, 0, 0))) as fillet2_3_piece_10:
        with BuildLine():
            CenterArc((1 + FILLET2_R, FILLET2_R), FILLET2_R, 180, 90)
            Line((1 + FILLET2_R, 0), (1 + FILLET2_R, -FILLET2_R * 0.02))
            Line((1 + FILLET2_R, -FILLET2_R * 0.02), (1 - FILLET2_R * 0.02, -FILLET2_R * 0.02))
            Line((1 - FILLET2_R * 0.02, -FILLET2_R * 0.02), (1 - FILLET2_R * 0.02, FILLET2_R))
            Line((1 - FILLET2_R * 0.02, FILLET2_R), (1, FILLET2_R))
        make_face()
    revolve(axis=Axis((14, -25, 23), (0, 1, 0)), revolution_arc=90, mode=Mode.SUBTRACT)

    # Fillet3
    fillet3_edges = [part.edges().sort_by_distance(p)[0] for p in [
        (-6, -28, 10),
        (9, -28, 10),
    ]]
    fillet(fillet3_edges, radius=FILLET3_R)


solid = part.part
